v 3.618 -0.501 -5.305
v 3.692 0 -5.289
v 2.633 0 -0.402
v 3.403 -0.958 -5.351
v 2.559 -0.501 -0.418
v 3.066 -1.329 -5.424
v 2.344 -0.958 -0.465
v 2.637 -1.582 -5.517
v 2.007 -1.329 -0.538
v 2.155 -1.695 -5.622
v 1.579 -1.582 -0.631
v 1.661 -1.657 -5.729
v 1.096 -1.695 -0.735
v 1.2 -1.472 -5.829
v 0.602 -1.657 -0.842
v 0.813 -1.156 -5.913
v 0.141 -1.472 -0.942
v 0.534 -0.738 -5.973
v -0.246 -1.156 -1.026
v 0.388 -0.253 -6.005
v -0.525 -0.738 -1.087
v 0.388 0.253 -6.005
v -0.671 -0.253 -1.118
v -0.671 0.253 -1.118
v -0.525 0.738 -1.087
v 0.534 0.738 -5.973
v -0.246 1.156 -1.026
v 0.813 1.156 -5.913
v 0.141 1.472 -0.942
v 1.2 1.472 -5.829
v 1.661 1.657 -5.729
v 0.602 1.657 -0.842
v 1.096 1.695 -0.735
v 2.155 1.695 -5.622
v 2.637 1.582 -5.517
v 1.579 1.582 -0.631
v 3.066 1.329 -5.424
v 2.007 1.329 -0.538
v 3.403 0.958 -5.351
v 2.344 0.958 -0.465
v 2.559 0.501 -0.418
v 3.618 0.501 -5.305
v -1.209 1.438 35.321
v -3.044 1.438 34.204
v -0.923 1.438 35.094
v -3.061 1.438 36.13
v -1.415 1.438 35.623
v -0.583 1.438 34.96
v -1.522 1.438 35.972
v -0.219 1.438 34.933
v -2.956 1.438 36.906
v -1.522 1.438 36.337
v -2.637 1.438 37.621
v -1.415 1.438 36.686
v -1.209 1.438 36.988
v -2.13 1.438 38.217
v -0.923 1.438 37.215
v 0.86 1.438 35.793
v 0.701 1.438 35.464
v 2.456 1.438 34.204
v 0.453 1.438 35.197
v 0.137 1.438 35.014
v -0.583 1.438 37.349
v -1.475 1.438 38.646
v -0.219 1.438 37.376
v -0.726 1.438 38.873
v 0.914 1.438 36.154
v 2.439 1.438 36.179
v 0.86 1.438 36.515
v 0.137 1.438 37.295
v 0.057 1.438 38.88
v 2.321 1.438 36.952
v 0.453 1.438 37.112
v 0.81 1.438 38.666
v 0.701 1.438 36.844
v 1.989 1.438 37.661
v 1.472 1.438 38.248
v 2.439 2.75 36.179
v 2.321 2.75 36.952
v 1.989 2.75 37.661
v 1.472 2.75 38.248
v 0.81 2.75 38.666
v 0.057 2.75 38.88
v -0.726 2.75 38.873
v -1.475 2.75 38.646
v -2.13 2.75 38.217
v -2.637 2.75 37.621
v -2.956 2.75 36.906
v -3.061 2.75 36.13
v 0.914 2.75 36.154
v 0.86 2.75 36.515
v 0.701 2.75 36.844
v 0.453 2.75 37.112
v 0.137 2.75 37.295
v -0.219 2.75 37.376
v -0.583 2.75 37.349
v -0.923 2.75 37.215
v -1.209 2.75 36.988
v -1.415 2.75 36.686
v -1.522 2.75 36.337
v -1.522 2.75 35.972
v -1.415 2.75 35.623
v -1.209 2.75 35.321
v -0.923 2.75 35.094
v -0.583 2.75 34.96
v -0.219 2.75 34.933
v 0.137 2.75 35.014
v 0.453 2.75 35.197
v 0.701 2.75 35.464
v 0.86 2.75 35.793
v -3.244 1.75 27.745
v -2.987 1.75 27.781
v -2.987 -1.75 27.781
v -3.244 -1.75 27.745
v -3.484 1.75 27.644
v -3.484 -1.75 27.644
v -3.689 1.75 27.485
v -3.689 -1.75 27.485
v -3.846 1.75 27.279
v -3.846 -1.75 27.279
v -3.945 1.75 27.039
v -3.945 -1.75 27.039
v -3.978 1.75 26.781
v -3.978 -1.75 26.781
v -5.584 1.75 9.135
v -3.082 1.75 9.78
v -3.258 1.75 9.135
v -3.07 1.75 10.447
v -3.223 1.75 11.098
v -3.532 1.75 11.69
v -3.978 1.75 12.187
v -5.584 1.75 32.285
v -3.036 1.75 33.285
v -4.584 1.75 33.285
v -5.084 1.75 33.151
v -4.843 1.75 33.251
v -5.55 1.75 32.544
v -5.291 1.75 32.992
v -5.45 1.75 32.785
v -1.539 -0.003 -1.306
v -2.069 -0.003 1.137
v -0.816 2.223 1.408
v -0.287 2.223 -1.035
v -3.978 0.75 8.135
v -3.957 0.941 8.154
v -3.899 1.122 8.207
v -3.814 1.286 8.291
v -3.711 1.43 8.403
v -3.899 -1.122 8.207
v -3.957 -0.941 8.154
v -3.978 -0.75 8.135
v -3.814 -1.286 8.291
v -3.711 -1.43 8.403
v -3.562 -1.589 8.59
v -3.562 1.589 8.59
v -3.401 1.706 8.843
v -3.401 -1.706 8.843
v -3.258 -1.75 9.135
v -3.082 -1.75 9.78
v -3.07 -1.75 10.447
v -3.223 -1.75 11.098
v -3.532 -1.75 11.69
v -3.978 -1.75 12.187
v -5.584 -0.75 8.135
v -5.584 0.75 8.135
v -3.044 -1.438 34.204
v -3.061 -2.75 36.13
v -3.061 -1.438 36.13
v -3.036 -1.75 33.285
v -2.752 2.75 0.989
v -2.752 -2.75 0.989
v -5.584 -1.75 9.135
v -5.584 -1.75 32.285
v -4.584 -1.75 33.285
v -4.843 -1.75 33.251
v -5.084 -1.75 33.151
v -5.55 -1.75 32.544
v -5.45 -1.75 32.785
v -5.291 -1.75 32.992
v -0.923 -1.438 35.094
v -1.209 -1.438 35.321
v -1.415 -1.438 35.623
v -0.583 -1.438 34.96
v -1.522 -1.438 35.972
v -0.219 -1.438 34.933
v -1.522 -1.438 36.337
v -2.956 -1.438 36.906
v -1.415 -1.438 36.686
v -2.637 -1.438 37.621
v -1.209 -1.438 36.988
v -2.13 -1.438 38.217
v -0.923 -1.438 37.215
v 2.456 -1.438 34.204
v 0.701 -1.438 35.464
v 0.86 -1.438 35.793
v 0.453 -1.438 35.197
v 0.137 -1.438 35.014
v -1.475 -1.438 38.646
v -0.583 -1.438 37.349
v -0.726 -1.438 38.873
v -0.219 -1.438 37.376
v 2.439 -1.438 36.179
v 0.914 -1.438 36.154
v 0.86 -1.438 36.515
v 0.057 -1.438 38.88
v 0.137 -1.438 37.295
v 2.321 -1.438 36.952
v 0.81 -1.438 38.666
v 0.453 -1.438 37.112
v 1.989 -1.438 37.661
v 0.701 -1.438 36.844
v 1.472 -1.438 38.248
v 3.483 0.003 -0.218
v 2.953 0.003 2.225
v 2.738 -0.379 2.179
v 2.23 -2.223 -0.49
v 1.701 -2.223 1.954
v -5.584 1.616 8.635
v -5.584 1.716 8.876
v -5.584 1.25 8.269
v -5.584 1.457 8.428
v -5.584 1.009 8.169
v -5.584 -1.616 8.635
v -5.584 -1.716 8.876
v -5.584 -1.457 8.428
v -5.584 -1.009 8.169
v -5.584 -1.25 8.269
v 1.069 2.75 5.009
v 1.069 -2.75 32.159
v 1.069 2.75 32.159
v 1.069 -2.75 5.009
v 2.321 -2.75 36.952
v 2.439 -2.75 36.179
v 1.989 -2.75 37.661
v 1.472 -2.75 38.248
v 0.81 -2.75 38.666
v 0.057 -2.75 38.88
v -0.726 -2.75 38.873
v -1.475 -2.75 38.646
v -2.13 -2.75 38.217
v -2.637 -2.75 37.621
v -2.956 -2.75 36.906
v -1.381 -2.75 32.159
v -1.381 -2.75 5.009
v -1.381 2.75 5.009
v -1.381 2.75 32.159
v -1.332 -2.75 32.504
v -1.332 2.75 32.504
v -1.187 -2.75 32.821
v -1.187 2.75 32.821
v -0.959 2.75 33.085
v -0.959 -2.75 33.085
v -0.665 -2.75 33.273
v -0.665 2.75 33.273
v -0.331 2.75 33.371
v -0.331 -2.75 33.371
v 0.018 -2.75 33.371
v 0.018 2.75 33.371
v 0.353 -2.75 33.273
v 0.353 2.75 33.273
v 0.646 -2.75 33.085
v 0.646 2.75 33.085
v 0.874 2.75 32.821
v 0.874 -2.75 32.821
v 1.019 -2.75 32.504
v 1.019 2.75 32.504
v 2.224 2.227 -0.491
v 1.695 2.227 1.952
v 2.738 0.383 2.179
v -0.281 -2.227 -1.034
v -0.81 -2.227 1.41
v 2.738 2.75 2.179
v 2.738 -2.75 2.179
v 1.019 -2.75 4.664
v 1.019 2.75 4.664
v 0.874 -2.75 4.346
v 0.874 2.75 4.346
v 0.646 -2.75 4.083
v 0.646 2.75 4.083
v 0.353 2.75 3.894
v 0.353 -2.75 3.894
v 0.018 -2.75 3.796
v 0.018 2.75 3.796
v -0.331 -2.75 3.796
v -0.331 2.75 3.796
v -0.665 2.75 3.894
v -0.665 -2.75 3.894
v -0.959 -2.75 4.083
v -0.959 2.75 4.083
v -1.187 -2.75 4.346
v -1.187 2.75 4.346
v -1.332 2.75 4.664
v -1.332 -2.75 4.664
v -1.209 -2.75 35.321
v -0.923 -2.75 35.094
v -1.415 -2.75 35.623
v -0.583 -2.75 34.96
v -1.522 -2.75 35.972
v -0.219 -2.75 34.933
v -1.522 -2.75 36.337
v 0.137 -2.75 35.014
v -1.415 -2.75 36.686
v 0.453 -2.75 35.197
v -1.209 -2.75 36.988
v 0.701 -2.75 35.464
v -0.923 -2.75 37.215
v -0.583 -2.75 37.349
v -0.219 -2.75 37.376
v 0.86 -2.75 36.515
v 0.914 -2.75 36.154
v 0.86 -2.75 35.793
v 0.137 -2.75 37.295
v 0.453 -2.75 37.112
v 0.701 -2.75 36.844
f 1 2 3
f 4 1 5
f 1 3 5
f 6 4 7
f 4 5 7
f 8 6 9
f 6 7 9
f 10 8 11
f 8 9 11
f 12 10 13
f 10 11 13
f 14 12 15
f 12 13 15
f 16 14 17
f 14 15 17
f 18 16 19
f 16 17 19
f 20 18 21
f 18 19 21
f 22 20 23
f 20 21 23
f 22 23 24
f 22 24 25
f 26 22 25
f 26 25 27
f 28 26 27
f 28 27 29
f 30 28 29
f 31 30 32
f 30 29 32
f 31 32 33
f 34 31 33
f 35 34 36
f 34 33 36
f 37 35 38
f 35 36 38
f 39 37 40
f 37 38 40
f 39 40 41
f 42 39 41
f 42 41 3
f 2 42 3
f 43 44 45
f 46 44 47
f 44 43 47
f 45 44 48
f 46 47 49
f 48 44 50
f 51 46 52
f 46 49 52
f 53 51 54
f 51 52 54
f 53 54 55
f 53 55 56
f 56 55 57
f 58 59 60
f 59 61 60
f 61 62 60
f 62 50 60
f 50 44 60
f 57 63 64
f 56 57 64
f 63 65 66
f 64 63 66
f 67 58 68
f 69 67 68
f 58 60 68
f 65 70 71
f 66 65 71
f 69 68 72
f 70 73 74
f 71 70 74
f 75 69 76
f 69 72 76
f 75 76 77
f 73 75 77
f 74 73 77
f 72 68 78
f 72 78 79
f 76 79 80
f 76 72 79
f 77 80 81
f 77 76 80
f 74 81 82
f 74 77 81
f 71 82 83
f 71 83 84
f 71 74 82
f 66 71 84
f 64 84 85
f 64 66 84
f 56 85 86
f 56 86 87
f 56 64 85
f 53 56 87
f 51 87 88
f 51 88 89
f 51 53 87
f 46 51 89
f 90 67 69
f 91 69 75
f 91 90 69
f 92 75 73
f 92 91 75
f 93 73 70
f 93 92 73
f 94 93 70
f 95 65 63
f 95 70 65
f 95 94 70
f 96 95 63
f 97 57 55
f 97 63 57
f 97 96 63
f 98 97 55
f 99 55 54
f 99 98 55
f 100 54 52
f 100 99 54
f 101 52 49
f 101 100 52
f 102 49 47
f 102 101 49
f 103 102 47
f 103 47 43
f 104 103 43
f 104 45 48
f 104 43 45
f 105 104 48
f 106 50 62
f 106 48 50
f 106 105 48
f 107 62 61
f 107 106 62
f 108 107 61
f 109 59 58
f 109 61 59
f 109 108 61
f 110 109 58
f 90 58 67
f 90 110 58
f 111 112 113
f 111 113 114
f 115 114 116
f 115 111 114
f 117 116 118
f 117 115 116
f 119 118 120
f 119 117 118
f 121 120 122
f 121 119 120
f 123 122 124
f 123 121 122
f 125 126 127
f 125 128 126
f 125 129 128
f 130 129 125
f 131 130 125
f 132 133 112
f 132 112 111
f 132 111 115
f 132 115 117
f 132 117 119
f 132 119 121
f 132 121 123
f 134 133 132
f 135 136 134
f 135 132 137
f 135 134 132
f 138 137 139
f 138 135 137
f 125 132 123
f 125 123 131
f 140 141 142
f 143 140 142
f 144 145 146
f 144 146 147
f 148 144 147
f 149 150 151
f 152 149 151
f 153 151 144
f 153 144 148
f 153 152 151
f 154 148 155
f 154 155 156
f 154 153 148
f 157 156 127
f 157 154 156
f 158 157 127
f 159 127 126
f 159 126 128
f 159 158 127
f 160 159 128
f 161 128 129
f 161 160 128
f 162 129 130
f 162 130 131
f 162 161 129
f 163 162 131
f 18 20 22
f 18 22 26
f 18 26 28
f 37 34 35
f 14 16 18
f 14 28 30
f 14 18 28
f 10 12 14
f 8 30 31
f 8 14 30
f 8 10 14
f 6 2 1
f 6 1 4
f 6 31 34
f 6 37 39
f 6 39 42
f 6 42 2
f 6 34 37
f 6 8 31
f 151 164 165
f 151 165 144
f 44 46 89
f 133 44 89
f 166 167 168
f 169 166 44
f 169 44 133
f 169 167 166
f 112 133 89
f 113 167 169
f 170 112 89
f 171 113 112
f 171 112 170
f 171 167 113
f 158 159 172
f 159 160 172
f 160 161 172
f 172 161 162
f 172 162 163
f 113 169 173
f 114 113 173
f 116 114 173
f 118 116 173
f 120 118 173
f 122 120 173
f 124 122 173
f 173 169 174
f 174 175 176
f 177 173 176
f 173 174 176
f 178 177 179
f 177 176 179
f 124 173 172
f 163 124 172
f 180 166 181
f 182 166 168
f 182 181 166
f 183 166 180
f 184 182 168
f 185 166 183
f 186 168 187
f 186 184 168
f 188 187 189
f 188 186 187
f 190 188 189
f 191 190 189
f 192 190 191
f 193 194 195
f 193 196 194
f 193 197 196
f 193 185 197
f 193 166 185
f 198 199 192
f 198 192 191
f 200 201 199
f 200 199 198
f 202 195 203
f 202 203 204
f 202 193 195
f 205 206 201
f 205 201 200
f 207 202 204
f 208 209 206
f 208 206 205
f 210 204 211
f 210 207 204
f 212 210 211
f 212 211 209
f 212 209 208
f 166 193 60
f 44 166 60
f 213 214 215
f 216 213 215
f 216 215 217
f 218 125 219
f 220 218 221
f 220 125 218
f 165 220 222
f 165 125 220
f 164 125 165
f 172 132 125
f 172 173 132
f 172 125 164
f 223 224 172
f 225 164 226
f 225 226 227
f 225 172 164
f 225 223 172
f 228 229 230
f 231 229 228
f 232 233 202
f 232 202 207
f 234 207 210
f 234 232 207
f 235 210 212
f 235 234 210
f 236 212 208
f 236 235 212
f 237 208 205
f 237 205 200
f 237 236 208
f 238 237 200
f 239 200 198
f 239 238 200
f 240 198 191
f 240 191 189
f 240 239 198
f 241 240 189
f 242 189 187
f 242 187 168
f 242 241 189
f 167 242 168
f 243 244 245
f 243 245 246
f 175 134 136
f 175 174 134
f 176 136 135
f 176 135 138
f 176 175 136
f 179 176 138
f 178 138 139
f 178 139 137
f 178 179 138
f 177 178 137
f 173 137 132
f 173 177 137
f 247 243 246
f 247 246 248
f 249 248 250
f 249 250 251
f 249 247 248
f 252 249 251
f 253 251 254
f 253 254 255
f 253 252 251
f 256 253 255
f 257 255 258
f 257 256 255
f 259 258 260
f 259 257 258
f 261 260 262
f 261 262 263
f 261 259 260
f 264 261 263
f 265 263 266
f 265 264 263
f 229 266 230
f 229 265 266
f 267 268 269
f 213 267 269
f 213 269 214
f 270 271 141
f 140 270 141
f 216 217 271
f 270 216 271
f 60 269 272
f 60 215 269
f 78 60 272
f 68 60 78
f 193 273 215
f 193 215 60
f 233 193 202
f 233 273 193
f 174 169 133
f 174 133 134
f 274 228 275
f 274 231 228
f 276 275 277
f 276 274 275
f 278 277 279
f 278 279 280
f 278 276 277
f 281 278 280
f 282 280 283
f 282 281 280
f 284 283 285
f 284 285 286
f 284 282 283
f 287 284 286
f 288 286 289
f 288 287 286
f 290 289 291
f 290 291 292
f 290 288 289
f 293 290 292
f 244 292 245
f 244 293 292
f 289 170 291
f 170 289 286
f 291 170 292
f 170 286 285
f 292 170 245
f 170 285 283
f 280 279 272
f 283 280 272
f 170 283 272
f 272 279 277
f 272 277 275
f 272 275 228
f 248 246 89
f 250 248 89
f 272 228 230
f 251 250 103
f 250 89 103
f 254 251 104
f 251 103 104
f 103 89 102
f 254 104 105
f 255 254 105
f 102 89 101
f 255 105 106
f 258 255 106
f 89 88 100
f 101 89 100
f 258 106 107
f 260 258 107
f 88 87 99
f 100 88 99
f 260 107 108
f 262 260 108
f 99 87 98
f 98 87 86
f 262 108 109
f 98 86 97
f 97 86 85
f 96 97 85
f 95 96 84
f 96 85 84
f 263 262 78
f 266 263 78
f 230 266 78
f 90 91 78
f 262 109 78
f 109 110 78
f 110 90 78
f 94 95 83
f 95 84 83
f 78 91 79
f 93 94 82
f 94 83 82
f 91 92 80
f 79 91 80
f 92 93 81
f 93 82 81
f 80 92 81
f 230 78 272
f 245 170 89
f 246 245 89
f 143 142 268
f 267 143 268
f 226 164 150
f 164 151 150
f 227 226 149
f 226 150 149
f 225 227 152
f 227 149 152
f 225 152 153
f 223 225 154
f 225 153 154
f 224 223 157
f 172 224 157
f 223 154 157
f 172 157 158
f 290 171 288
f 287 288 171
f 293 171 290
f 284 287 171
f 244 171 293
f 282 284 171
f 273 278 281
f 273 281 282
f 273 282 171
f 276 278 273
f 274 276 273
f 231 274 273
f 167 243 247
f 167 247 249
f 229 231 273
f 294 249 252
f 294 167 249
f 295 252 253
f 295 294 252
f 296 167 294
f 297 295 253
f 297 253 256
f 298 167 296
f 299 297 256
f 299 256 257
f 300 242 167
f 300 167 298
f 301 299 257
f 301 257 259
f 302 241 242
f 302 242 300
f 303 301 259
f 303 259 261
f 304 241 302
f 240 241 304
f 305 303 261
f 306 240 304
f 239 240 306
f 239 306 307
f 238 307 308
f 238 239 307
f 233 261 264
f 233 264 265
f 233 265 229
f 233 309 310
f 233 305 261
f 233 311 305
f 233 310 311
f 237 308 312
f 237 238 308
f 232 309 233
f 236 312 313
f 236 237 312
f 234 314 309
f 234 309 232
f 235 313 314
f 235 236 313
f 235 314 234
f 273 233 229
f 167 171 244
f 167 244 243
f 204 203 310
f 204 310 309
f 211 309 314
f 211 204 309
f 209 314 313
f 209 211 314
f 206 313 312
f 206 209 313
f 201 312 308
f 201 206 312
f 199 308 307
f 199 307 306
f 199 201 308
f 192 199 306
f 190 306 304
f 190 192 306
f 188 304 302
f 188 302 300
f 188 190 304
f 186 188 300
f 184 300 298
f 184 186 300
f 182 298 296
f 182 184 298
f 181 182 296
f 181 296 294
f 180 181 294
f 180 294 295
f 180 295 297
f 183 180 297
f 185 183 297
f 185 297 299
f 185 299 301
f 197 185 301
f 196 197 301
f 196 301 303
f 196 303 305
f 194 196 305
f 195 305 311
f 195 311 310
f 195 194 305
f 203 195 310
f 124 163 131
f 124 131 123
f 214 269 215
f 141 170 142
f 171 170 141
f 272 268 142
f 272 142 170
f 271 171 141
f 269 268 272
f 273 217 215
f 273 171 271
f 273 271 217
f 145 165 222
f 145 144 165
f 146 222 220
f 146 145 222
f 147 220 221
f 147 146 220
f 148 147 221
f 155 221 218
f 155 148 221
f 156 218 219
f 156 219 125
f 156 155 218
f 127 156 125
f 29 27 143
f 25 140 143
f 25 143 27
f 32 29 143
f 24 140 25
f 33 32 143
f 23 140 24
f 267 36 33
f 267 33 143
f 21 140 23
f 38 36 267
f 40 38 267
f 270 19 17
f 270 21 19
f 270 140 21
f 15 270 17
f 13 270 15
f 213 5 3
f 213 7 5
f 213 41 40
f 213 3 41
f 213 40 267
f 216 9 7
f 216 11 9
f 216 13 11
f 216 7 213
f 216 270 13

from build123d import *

# Parameters (mm, degrees)
F0_R        = 1.225
F1_DEPTH    = 2.75
F3_DEPTH    = 1.75
F4_W        = 2.8751536738
F4_H        = 5.9757605195
F5_DEPTH    = 13
F6_T1_DEPTH = 3.5
F7_R        = 1
F9_R        = 1.7
F10_DEPTH   = 2.5
F11_DEPTH   = 7.5


# Not quite as in the source:
# - a fillet or chamfer that OpenCascade refuses, or shapes differently, is made with other operations: its cross-section is extruded or revolved along the edge and cut away or added


with BuildPart() as f1:
    # F0 (on Front) → F1 (new body, symmetric)
    with BuildSketch(Plane.XZ):
        with BuildLine():
            Line((-2.7517704794, 0.9889971563), (2.7379837894, 2.1785584332))
            Line((2.7379837894, 2.1785584332), (2.4390654013, 36.1785584332))
            ThreePointArc((2.4390654013, 36.1785584332), (-0.3350046134, 38.9042758715), (-3.0607220517, 36.1302058568))
            Line((-3.0607220517, 36.1302058568), (-2.7517704794, 0.9889971563))
        make_face()
        with BuildLine():
            Line((-1.3813343576, 5.0087761541), (-1.3813707205, 32.1587761541))
            ThreePointArc((-1.3813707205, 32.1587761541), (-0.1563723611, 33.3837777948), (1.0686292795, 32.1587794355))
            Line((1.0686292795, 32.1587794355), (1.0686656424, 5.0087794355))
            ThreePointArc((1.0686656424, 5.0087794355), (-0.1563327169, 3.7837777948), (-1.3813343576, 5.0087761541))
        make_face(mode=Mode.SUBTRACT)
        with Locations((-0.3108283252, 36.154382145)):
            Circle(F0_R, mode=Mode.SUBTRACT)
    extrude(amount=F1_DEPTH, both=True)

    # F2 (on Front) → F3 (join, symmetric)
    with BuildSketch(Plane.XZ):
        Polygon((-2.9082125786, 27.7813646846), (-2.9082125786, 33.2853169523), (-5.5837442831, 33.2853169523), (-5.5837442831, 8.1353169523), (-3.9784252097, 8.1353169523), (-3.9784252097, 12.1868369773), (-3.9784252097, 27.7813646846), align=None)
        with BuildLine():
            Line((-3.9784252097, 12.1868369773), (-3.9784252097, 8.1353169523))
            ThreePointArc((-3.9784252097, 8.1353169523), (-3.0542834819, 10.1610769648), (-3.9784252097, 12.1868369773))
        make_face()
    extrude(amount=F3_DEPTH, both=True)

    # F4 (on Right) → F5 (cut, symmetric)
    with BuildSketch(Plane.YZ):
        with Locations((0, 37.1919497848)):
            Rectangle(F4_W, F4_H)
    extrude(amount=F5_DEPTH, both=True, mode=Mode.SUBTRACT)

    # F6: fillet of radius 1 on 1 edges, made by hand

    # F6_s2 → F6_t1 (join)
    with BuildSketch(Plane.XZ.offset(-1.75)):
        with BuildLine():
            ThreePointArc((-2.9784252097, 27.7813646846), (-3.6855319909, 27.4884714657), (-3.9784252097, 26.7813646846))
            Line((-3.9784252097, 26.7813646846), (-3.9784252097, 27.7813646846))
            Line((-3.9784252097, 27.7813646846), (-2.9784252097, 27.7813646846))
        make_face()
    extrude(amount=F6_T1_DEPTH)

    # F7
    f7_edges = [f1.edges().sort_by_distance(p)[0] for p in [
        (-5.583744, 0, 33.285317),
        (-4.781085, 1.75, 8.135317),
        (-4.781085, -1.75, 8.135317),
    ]]
    fillet(f7_edges, radius=F7_R)

    # F9 (on offset) → F10 (join)
    with BuildSketch(Plane(origin=(-0.3281029821, 0, 1.5141756728), x_dir=(0.9773189207, 0, 0.2117728201), z_dir=(0.2117728201, 0, -0.9773189207))):
        Polygon((2.0697711183, -2.2267070605), (3.3573344565, -0.0034180592), (2.0756913705, 2.2232890013), (-0.4935150537, 2.2267070605), (-1.7810783919, 0.0034180592), (-0.4994353059, -2.2232890013), align=None)
        with Locations((0.7881280323, 0)):
            Circle(F9_R, mode=Mode.SUBTRACT)
    extrude(amount=F10_DEPTH)

    # F11 (add): a face of the model
    f11_faces = [f1.faces().sort_by_distance(p)[0] for p in [
        (0.4421494557, 0, 1.6810797688),
    ]]
    extrude(f11_faces, amount=F11_DEPTH)


solid = f1.part
